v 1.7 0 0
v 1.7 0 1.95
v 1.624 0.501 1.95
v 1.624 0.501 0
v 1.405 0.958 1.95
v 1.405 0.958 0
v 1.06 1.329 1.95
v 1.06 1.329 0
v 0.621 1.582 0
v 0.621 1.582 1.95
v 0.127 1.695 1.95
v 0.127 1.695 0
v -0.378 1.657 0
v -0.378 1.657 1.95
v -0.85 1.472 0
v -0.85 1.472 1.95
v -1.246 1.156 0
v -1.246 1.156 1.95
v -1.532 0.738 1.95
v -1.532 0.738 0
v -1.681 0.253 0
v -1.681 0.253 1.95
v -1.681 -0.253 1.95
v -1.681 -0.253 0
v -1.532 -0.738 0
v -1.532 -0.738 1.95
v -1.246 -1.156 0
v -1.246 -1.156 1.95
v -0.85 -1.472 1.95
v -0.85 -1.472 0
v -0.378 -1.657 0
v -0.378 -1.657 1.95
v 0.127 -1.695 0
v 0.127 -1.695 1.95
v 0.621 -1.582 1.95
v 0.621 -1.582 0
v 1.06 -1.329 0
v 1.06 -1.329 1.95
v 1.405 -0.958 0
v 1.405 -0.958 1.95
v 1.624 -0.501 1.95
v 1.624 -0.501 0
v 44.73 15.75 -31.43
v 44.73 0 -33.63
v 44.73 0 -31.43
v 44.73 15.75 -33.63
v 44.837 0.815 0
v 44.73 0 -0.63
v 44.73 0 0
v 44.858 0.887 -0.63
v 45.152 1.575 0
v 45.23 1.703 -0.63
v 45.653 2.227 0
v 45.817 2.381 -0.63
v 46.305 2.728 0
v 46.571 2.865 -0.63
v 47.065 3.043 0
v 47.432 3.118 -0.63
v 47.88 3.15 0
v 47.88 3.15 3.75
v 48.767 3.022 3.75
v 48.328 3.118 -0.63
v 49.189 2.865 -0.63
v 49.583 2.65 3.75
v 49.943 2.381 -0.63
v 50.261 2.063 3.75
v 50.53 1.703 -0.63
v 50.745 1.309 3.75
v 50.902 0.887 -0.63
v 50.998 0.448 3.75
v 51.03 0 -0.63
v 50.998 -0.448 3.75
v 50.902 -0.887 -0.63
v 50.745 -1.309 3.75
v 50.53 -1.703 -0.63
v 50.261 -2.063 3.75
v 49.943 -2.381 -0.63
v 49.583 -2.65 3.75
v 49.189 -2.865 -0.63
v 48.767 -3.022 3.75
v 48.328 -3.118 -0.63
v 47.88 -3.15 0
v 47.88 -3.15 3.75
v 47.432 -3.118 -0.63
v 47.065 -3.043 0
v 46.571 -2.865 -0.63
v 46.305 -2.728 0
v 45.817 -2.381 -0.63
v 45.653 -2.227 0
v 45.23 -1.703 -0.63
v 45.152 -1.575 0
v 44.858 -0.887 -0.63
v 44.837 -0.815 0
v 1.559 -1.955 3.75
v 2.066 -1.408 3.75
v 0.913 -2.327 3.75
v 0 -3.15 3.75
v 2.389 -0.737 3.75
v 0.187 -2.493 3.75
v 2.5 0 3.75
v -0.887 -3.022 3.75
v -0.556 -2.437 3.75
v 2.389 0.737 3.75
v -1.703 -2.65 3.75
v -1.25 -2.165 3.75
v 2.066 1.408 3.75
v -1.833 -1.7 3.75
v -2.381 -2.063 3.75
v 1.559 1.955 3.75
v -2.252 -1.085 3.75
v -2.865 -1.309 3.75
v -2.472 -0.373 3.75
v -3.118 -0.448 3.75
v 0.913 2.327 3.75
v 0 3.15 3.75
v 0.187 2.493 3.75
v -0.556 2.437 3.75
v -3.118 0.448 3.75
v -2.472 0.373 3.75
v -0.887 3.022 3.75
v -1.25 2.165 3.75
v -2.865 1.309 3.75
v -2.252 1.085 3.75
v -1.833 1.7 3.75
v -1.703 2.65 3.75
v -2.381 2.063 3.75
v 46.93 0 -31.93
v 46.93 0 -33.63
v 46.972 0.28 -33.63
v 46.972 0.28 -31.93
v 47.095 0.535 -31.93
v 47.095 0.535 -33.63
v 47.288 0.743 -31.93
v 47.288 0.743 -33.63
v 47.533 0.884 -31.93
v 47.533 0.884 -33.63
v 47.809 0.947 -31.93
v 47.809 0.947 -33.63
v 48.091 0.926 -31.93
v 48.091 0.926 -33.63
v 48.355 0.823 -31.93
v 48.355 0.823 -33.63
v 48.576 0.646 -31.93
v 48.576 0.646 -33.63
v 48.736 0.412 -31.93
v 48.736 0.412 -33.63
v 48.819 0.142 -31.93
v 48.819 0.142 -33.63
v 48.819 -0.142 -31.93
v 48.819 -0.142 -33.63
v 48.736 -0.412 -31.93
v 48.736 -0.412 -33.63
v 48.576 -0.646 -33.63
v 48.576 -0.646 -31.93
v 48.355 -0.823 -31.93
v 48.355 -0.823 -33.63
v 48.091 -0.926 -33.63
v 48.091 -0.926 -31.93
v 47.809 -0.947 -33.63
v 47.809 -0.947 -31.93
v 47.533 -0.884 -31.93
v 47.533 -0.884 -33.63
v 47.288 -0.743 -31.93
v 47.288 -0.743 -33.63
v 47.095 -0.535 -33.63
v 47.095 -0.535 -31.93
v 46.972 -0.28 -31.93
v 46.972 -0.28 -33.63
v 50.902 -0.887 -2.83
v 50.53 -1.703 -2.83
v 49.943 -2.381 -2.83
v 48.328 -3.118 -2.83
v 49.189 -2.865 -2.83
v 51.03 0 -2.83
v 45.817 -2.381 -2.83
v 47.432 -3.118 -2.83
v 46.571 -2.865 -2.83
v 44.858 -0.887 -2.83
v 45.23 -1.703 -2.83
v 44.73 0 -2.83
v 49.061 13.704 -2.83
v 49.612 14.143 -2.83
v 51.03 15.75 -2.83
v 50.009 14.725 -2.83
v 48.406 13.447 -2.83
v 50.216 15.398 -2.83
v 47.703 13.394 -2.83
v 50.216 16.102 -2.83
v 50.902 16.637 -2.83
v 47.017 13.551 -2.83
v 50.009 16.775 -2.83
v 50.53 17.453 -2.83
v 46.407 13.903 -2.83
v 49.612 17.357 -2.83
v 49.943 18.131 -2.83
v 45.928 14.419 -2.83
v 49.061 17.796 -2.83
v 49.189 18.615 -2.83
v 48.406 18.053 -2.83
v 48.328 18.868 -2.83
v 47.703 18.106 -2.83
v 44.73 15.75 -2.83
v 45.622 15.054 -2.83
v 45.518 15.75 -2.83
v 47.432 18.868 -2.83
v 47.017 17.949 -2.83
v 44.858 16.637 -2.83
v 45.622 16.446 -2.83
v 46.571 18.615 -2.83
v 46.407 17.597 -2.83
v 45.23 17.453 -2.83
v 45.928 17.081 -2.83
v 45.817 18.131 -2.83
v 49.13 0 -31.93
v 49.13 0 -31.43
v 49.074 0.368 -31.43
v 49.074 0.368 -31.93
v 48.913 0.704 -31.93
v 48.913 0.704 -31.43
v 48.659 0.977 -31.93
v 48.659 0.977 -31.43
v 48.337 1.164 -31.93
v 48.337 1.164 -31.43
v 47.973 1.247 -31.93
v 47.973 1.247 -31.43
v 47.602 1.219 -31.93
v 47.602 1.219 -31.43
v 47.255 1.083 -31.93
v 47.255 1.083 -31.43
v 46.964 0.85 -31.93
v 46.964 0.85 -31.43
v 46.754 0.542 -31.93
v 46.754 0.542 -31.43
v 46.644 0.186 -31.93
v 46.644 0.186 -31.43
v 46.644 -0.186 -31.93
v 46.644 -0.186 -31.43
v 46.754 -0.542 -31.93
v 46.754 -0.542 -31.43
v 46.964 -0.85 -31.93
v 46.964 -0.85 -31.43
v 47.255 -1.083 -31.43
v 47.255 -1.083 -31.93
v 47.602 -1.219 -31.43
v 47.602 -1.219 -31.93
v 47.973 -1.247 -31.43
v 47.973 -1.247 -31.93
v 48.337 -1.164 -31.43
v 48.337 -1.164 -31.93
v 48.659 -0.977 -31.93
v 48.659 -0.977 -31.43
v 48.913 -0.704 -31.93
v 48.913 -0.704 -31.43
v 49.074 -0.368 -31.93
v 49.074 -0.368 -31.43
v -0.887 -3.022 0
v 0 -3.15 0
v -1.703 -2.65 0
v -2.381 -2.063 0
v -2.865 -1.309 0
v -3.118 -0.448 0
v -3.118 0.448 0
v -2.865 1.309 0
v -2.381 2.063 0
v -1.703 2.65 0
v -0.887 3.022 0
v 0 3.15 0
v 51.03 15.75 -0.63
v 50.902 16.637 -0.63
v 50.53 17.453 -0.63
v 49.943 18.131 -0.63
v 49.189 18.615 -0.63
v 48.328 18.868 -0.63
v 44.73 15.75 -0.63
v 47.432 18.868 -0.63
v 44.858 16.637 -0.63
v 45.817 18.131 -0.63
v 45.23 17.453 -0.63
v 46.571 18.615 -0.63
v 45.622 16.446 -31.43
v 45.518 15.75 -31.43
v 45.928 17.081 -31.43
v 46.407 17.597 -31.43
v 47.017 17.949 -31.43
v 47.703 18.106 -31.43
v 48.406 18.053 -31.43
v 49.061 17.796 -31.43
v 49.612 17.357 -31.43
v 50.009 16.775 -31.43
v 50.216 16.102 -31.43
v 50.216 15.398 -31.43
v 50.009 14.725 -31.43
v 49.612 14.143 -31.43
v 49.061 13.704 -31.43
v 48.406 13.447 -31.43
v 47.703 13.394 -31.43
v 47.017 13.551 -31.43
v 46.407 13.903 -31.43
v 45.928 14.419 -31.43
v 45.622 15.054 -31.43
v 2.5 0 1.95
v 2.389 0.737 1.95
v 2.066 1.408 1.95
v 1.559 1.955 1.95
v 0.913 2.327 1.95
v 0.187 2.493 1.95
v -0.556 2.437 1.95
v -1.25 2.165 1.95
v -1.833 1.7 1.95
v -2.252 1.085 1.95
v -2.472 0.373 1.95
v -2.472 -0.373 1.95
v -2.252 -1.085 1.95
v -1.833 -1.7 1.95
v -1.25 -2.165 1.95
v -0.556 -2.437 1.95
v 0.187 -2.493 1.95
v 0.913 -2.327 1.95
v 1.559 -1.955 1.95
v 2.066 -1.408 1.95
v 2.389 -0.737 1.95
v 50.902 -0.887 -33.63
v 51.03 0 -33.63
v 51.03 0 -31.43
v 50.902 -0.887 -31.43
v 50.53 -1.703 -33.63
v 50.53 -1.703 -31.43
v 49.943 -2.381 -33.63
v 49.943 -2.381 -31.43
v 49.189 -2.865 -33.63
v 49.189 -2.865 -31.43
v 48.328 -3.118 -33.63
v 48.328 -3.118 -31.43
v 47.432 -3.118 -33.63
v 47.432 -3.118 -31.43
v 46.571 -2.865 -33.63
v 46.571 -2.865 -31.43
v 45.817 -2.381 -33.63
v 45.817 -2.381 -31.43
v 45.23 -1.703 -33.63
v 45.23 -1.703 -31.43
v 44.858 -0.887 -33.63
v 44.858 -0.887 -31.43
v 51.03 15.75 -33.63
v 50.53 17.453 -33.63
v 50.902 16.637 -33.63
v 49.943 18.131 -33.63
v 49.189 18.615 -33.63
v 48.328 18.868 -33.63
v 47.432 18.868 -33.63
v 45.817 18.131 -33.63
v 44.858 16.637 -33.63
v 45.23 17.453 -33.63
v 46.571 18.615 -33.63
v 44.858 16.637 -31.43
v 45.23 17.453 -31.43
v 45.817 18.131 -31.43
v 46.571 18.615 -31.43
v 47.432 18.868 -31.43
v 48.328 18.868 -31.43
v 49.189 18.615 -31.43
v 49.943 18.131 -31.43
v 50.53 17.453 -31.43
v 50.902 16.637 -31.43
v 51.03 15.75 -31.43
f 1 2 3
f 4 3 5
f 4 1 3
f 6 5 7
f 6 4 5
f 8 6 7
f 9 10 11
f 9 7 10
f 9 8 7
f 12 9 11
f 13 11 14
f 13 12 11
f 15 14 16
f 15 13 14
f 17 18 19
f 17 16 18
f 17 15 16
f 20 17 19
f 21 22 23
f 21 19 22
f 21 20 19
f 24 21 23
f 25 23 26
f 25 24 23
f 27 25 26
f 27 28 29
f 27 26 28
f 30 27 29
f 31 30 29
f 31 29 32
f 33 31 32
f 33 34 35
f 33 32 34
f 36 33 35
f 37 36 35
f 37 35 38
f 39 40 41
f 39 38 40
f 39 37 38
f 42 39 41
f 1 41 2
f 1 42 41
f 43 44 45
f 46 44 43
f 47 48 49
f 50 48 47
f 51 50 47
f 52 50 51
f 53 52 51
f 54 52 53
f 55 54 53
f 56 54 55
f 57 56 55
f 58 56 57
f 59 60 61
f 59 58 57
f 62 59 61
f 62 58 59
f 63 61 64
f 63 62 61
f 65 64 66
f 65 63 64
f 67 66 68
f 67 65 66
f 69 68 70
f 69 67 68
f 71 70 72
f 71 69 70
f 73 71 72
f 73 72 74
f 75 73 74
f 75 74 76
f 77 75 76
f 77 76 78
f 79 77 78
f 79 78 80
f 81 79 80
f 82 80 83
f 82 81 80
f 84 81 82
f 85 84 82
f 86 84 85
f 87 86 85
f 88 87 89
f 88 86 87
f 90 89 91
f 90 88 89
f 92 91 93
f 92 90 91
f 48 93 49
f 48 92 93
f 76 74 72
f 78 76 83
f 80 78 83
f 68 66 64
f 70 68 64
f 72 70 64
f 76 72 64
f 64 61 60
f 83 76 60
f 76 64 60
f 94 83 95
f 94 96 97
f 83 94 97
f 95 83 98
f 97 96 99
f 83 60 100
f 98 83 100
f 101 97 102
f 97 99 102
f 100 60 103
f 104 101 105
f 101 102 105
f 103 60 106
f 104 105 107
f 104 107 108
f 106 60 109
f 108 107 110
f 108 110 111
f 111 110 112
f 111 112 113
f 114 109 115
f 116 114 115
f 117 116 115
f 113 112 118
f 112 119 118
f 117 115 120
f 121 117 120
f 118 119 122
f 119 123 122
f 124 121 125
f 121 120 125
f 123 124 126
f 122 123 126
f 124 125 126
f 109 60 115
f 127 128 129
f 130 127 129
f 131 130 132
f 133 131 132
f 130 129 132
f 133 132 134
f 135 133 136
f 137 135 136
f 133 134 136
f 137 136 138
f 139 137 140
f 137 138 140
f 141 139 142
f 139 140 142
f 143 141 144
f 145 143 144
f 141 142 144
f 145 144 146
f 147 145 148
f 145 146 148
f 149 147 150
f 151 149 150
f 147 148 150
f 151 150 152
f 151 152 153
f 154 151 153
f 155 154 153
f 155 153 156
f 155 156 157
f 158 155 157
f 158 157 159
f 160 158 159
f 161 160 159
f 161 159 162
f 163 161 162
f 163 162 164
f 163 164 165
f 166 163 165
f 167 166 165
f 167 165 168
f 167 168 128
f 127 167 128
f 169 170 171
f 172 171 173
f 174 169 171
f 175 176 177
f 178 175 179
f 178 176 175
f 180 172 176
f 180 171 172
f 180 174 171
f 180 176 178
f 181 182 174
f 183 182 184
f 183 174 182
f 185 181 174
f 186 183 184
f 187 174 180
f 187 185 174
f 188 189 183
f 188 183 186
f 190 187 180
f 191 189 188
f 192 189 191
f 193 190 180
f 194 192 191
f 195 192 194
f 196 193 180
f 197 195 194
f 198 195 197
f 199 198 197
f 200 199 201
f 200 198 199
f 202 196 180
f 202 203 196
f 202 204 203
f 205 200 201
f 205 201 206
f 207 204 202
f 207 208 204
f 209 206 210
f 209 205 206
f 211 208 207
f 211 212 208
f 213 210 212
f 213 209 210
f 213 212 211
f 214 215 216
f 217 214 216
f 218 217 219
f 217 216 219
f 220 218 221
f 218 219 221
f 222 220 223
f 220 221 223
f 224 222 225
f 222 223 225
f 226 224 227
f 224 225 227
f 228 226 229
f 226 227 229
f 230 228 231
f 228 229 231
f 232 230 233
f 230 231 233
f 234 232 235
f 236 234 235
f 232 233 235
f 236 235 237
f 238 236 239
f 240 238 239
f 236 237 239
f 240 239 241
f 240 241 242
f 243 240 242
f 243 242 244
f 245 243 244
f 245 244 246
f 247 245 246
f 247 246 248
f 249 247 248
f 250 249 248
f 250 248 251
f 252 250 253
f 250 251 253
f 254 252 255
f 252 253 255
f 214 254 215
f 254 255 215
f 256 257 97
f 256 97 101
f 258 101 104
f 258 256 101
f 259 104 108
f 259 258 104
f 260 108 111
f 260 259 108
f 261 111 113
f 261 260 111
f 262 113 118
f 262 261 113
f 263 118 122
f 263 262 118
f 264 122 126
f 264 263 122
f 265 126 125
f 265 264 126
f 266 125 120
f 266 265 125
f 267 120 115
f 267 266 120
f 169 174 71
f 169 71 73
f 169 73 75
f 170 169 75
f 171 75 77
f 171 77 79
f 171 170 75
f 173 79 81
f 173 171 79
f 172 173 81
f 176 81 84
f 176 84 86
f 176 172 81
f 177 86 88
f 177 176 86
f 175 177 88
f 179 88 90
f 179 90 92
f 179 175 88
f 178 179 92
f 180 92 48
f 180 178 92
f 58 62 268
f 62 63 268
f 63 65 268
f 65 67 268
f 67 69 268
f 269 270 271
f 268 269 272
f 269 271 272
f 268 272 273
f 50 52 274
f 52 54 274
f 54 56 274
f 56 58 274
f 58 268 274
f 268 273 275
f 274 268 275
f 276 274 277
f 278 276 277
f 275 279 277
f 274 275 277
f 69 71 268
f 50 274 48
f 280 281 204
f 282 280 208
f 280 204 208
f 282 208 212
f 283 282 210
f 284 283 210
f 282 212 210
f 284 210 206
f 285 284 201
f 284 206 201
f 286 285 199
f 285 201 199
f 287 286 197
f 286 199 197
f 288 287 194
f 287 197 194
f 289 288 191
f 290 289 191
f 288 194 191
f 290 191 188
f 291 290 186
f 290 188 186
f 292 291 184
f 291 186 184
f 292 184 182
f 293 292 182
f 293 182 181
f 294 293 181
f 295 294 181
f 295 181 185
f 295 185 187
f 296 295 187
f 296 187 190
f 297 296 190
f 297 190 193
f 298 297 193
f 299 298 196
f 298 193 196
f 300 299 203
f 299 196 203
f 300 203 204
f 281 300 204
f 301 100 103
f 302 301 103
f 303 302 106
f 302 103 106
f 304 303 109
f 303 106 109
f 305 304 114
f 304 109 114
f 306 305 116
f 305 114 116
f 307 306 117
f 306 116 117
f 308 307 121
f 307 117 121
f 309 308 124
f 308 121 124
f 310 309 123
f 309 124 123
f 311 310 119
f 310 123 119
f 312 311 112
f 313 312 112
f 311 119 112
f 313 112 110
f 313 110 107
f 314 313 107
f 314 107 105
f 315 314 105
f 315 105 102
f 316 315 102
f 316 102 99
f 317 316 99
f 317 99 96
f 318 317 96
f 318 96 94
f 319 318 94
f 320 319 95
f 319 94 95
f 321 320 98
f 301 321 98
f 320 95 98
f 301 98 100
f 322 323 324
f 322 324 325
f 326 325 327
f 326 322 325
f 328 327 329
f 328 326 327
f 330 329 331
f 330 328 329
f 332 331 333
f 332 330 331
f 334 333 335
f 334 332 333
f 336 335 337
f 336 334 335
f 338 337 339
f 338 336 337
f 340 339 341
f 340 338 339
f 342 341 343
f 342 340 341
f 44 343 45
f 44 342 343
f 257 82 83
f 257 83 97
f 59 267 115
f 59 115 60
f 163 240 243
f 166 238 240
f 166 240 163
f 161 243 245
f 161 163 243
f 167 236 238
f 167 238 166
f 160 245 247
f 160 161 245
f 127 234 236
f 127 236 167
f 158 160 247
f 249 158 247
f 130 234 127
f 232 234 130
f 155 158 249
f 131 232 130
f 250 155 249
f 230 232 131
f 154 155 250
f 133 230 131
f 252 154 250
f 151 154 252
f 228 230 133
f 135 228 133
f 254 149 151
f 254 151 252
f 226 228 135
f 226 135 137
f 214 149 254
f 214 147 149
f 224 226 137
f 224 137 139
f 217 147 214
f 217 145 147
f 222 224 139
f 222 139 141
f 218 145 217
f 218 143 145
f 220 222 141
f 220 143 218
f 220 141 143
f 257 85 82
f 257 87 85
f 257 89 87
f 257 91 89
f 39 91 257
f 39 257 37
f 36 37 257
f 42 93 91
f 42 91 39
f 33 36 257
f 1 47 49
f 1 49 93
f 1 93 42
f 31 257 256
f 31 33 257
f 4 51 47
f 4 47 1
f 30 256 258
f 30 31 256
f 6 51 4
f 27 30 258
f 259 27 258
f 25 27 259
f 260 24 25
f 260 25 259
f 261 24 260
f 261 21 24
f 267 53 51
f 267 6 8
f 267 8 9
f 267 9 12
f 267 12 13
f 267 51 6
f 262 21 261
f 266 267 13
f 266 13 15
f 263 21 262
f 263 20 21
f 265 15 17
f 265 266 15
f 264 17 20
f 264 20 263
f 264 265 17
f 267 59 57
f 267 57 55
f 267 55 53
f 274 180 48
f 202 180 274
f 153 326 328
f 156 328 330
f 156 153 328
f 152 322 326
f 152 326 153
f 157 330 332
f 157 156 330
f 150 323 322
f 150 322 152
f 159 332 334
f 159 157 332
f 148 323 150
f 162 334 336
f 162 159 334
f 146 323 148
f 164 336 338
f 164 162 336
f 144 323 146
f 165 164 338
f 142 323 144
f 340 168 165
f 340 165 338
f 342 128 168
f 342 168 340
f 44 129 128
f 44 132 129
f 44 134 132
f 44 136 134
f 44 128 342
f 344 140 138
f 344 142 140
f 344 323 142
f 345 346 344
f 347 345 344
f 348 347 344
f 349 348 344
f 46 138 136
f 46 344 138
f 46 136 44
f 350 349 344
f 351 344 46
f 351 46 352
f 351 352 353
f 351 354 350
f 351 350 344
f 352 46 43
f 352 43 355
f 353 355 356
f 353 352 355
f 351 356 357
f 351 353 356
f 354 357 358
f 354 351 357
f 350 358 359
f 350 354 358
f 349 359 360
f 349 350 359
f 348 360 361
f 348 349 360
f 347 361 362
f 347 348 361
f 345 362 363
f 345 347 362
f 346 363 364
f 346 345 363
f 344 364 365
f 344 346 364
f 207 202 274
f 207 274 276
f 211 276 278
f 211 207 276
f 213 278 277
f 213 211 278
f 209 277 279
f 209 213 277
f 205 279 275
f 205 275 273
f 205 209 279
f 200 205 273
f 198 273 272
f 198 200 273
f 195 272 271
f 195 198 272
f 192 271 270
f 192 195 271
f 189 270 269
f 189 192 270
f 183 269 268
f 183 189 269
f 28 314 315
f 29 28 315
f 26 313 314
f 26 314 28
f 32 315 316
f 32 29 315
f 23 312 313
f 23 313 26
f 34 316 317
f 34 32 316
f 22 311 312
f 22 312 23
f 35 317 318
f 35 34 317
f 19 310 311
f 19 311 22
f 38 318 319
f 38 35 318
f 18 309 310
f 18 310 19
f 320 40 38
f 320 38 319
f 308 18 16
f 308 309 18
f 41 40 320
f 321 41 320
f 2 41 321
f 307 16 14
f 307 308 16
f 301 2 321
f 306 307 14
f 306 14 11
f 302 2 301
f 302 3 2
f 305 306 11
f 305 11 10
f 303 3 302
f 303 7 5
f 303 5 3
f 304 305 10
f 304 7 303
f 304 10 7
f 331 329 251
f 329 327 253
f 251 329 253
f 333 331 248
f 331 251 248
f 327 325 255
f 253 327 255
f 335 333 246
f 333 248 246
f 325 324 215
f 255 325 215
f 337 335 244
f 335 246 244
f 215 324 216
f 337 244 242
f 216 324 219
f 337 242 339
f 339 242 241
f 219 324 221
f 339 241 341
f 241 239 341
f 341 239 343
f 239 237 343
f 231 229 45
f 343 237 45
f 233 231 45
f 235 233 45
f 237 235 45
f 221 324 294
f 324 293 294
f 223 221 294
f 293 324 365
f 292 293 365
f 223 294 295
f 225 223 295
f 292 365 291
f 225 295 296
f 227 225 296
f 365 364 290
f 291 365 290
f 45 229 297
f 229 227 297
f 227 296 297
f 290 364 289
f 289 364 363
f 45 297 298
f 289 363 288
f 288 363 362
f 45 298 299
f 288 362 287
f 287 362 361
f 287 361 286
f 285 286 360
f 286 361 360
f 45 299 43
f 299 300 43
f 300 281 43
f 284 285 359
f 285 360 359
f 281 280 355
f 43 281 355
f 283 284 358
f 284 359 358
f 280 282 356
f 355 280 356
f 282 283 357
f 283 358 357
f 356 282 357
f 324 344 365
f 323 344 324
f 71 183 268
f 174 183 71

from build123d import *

# Parameters (mm, degrees)
CROQUIS1_R              = 1.7
SALIENTE_EXTRUIR1_DEPTH = 3.75
SALIENTE_EXTRUIR2_START = 0.63
CROQUIS2_R              = 3.15
SALIENTE_EXTRUIR2_DEPTH = 0.63
CROQUIS4_R              = 2.5
CORTAR_EXTRUIR1_DEPTH   = 1.8
SALIENTE_EXTRUIR3_START = 2.2
SALIENTE_EXTRUIR3_DEPTH = 2.2
CROQUIS6_R              = 2.3625
SALIENTE_EXTRUIR4_DEPTH = 28.6
SALIENTE_EXTRUIR5_START = 2.2
CROQUIS7_R              = 0.95
SALIENTE_EXTRUIR5_DEPTH = 2.2
CROQUIS8_R              = 1.25
CORTAR_EXTRUIR2_DEPTH   = 0.5


with BuildPart() as part:
    # Croquis1 → Saliente-Extruir1 (new body)
    with BuildSketch(Plane.XY):
        with BuildLine():
            Line((0, 3.15), (47.88, 3.15))
            ThreePointArc((47.88, 3.15), (51.03, 0), (47.88, -3.15))
            Line((47.88, -3.15), (0, -3.15))
            ThreePointArc((0, -3.15), (-3.15, 0), (0, 3.15))
        make_face()
        Circle(CROQUIS1_R, mode=Mode.SUBTRACT)
    extrude(amount=SALIENTE_EXTRUIR1_DEPTH)

    # Croquis2 → Saliente-Extruir2 (add)
    with BuildSketch(Plane(origin=(0, 0, 0), x_dir=(-1, 0, 0), z_dir=(0, 0, -1)).offset(SALIENTE_EXTRUIR2_START)):
        with Locations((-47.88, 0)):
            Circle(CROQUIS2_R)
    extrude(amount=-SALIENTE_EXTRUIR2_DEPTH)

    # Croquis4 → Cortar-Extruir1 (cut)
    with BuildSketch(Plane.XY.offset(3.75)):
        Circle(CROQUIS4_R)
    extrude(amount=-CORTAR_EXTRUIR1_DEPTH, mode=Mode.SUBTRACT)

    # Croquis5 → Saliente-Extruir3 (add)
    with BuildSketch(Plane(origin=(0, 0, -0.63), x_dir=(-1, 0, 0), z_dir=(0, 0, -1)).offset(SALIENTE_EXTRUIR3_START)):
        with BuildLine():
            Line((-51.03, 15.75), (-51.03, 0))
            ThreePointArc((-51.03, 0), (-47.88, -3.15), (-44.73, 0))
            Line((-44.73, 0), (-44.73, 15.75))
            ThreePointArc((-44.73, 15.75), (-47.88, 18.9), (-51.03, 15.75))
        make_face()
    extrude(amount=-SALIENTE_EXTRUIR3_DEPTH)

    # Croquis6 → Saliente-Extruir4 (add)
    with BuildSketch(Plane(origin=(0, 0, -2.83), x_dir=(-1, 0, 0), z_dir=(0, 0, -1))):
        with Locations((-47.88, 15.75)):
            Circle(CROQUIS6_R)
    extrude(amount=SALIENTE_EXTRUIR4_DEPTH)

    # Croquis7 → Saliente-Extruir5 (add)
    with BuildSketch(Plane(origin=(0, 0, -31.43), x_dir=(-1, 0, 0), z_dir=(0, 0, -1)).offset(SALIENTE_EXTRUIR5_START)):
        with BuildLine():
            Line((-51.03, 15.75), (-51.03, 0))
            ThreePointArc((-51.03, 0), (-47.88, -3.15), (-44.73, 0))
            Line((-44.73, 0), (-44.73, 15.75))
            ThreePointArc((-44.73, 15.75), (-47.88, 18.9), (-51.03, 15.75))
        make_face()
        with Locations((-47.88, 0)):
            Circle(CROQUIS7_R, mode=Mode.SUBTRACT)
    extrude(amount=-SALIENTE_EXTRUIR5_DEPTH)

    # Croquis8 → Cortar-Extruir2 (cut)
    with BuildSketch(Plane.XY.offset(-31.43)):
        with Locations((47.88, 0)):
            Circle(CROQUIS8_R)
    extrude(amount=-CORTAR_EXTRUIR2_DEPTH, mode=Mode.SUBTRACT)


solid = part.part
